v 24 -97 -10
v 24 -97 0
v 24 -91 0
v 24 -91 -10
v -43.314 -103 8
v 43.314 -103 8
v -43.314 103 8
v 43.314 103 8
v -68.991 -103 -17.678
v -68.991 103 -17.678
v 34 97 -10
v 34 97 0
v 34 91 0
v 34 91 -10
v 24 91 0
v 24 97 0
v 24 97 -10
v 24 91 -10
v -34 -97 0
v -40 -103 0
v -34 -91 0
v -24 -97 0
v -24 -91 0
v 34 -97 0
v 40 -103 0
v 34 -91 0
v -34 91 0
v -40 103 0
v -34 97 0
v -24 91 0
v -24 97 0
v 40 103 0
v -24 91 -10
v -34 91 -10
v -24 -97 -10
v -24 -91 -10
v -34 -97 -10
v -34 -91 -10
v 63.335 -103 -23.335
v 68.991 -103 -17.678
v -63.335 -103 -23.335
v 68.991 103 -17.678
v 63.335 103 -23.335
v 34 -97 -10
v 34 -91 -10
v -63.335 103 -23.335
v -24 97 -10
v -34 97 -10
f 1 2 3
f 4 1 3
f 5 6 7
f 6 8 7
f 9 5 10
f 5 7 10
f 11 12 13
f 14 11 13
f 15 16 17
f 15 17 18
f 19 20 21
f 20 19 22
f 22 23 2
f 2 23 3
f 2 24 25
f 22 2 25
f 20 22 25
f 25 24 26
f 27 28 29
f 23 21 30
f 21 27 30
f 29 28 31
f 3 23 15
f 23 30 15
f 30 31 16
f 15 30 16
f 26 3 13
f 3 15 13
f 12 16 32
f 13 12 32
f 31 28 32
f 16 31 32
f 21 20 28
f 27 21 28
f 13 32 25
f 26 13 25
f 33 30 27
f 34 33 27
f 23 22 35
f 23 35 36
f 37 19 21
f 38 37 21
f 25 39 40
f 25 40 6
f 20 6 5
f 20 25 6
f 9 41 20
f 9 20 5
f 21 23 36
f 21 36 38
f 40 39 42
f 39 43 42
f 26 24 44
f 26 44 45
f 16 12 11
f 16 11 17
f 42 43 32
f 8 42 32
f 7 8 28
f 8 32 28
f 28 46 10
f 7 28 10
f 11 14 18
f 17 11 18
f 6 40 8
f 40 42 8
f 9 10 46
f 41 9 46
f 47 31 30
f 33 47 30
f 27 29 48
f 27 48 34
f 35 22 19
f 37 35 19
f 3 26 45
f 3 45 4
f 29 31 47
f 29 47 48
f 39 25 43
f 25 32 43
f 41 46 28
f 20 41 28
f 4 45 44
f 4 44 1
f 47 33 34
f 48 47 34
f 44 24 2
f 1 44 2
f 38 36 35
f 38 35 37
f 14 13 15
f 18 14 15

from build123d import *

# Parameters (mm, degrees)
SALIENTE_EXTRUIR1_DEPTH = 103
CROQUIS2_W              = 10
CROQUIS2_H              = 6
SALIENTE_EXTRUIR2_DEPTH = 10


with BuildPart() as part:
    # Croquis1 → Saliente-Extruir1 (new, symmetric)
    with BuildSketch(Plane(origin=(0, 0, 0), x_dir=(1, 0, 0), z_dir=(0, 1, 0))):
        Polygon((-40, 0), (40, 0), (63.334523779, 23.334523779), (68.991378029, 17.67766953), (43.313708499, -8), (-43.313708499, -8), (-68.991378029, 17.67766953), (-63.334523779, 23.334523779), align=None)
    extrude(amount=SALIENTE_EXTRUIR1_DEPTH, both=True)

    # Croquis2 → Saliente-Extruir2 (add)
    with BuildSketch(Plane(origin=(0, 0, 0), x_dir=(-1, 0, 0), z_dir=(0, 0, -1))):
        with Locations((29, -94)):
            Rectangle(CROQUIS2_W, CROQUIS2_H)
        with Locations((-29, -94)):
            Rectangle(CROQUIS2_W, CROQUIS2_H)
    saliente_extruir2 = extrude(amount=SALIENTE_EXTRUIR2_DEPTH)

    # Simetría2: Saliente-Extruir2 across plane
    add(saliente_extruir2.mirror(Plane.ZX))


solid = part.part
